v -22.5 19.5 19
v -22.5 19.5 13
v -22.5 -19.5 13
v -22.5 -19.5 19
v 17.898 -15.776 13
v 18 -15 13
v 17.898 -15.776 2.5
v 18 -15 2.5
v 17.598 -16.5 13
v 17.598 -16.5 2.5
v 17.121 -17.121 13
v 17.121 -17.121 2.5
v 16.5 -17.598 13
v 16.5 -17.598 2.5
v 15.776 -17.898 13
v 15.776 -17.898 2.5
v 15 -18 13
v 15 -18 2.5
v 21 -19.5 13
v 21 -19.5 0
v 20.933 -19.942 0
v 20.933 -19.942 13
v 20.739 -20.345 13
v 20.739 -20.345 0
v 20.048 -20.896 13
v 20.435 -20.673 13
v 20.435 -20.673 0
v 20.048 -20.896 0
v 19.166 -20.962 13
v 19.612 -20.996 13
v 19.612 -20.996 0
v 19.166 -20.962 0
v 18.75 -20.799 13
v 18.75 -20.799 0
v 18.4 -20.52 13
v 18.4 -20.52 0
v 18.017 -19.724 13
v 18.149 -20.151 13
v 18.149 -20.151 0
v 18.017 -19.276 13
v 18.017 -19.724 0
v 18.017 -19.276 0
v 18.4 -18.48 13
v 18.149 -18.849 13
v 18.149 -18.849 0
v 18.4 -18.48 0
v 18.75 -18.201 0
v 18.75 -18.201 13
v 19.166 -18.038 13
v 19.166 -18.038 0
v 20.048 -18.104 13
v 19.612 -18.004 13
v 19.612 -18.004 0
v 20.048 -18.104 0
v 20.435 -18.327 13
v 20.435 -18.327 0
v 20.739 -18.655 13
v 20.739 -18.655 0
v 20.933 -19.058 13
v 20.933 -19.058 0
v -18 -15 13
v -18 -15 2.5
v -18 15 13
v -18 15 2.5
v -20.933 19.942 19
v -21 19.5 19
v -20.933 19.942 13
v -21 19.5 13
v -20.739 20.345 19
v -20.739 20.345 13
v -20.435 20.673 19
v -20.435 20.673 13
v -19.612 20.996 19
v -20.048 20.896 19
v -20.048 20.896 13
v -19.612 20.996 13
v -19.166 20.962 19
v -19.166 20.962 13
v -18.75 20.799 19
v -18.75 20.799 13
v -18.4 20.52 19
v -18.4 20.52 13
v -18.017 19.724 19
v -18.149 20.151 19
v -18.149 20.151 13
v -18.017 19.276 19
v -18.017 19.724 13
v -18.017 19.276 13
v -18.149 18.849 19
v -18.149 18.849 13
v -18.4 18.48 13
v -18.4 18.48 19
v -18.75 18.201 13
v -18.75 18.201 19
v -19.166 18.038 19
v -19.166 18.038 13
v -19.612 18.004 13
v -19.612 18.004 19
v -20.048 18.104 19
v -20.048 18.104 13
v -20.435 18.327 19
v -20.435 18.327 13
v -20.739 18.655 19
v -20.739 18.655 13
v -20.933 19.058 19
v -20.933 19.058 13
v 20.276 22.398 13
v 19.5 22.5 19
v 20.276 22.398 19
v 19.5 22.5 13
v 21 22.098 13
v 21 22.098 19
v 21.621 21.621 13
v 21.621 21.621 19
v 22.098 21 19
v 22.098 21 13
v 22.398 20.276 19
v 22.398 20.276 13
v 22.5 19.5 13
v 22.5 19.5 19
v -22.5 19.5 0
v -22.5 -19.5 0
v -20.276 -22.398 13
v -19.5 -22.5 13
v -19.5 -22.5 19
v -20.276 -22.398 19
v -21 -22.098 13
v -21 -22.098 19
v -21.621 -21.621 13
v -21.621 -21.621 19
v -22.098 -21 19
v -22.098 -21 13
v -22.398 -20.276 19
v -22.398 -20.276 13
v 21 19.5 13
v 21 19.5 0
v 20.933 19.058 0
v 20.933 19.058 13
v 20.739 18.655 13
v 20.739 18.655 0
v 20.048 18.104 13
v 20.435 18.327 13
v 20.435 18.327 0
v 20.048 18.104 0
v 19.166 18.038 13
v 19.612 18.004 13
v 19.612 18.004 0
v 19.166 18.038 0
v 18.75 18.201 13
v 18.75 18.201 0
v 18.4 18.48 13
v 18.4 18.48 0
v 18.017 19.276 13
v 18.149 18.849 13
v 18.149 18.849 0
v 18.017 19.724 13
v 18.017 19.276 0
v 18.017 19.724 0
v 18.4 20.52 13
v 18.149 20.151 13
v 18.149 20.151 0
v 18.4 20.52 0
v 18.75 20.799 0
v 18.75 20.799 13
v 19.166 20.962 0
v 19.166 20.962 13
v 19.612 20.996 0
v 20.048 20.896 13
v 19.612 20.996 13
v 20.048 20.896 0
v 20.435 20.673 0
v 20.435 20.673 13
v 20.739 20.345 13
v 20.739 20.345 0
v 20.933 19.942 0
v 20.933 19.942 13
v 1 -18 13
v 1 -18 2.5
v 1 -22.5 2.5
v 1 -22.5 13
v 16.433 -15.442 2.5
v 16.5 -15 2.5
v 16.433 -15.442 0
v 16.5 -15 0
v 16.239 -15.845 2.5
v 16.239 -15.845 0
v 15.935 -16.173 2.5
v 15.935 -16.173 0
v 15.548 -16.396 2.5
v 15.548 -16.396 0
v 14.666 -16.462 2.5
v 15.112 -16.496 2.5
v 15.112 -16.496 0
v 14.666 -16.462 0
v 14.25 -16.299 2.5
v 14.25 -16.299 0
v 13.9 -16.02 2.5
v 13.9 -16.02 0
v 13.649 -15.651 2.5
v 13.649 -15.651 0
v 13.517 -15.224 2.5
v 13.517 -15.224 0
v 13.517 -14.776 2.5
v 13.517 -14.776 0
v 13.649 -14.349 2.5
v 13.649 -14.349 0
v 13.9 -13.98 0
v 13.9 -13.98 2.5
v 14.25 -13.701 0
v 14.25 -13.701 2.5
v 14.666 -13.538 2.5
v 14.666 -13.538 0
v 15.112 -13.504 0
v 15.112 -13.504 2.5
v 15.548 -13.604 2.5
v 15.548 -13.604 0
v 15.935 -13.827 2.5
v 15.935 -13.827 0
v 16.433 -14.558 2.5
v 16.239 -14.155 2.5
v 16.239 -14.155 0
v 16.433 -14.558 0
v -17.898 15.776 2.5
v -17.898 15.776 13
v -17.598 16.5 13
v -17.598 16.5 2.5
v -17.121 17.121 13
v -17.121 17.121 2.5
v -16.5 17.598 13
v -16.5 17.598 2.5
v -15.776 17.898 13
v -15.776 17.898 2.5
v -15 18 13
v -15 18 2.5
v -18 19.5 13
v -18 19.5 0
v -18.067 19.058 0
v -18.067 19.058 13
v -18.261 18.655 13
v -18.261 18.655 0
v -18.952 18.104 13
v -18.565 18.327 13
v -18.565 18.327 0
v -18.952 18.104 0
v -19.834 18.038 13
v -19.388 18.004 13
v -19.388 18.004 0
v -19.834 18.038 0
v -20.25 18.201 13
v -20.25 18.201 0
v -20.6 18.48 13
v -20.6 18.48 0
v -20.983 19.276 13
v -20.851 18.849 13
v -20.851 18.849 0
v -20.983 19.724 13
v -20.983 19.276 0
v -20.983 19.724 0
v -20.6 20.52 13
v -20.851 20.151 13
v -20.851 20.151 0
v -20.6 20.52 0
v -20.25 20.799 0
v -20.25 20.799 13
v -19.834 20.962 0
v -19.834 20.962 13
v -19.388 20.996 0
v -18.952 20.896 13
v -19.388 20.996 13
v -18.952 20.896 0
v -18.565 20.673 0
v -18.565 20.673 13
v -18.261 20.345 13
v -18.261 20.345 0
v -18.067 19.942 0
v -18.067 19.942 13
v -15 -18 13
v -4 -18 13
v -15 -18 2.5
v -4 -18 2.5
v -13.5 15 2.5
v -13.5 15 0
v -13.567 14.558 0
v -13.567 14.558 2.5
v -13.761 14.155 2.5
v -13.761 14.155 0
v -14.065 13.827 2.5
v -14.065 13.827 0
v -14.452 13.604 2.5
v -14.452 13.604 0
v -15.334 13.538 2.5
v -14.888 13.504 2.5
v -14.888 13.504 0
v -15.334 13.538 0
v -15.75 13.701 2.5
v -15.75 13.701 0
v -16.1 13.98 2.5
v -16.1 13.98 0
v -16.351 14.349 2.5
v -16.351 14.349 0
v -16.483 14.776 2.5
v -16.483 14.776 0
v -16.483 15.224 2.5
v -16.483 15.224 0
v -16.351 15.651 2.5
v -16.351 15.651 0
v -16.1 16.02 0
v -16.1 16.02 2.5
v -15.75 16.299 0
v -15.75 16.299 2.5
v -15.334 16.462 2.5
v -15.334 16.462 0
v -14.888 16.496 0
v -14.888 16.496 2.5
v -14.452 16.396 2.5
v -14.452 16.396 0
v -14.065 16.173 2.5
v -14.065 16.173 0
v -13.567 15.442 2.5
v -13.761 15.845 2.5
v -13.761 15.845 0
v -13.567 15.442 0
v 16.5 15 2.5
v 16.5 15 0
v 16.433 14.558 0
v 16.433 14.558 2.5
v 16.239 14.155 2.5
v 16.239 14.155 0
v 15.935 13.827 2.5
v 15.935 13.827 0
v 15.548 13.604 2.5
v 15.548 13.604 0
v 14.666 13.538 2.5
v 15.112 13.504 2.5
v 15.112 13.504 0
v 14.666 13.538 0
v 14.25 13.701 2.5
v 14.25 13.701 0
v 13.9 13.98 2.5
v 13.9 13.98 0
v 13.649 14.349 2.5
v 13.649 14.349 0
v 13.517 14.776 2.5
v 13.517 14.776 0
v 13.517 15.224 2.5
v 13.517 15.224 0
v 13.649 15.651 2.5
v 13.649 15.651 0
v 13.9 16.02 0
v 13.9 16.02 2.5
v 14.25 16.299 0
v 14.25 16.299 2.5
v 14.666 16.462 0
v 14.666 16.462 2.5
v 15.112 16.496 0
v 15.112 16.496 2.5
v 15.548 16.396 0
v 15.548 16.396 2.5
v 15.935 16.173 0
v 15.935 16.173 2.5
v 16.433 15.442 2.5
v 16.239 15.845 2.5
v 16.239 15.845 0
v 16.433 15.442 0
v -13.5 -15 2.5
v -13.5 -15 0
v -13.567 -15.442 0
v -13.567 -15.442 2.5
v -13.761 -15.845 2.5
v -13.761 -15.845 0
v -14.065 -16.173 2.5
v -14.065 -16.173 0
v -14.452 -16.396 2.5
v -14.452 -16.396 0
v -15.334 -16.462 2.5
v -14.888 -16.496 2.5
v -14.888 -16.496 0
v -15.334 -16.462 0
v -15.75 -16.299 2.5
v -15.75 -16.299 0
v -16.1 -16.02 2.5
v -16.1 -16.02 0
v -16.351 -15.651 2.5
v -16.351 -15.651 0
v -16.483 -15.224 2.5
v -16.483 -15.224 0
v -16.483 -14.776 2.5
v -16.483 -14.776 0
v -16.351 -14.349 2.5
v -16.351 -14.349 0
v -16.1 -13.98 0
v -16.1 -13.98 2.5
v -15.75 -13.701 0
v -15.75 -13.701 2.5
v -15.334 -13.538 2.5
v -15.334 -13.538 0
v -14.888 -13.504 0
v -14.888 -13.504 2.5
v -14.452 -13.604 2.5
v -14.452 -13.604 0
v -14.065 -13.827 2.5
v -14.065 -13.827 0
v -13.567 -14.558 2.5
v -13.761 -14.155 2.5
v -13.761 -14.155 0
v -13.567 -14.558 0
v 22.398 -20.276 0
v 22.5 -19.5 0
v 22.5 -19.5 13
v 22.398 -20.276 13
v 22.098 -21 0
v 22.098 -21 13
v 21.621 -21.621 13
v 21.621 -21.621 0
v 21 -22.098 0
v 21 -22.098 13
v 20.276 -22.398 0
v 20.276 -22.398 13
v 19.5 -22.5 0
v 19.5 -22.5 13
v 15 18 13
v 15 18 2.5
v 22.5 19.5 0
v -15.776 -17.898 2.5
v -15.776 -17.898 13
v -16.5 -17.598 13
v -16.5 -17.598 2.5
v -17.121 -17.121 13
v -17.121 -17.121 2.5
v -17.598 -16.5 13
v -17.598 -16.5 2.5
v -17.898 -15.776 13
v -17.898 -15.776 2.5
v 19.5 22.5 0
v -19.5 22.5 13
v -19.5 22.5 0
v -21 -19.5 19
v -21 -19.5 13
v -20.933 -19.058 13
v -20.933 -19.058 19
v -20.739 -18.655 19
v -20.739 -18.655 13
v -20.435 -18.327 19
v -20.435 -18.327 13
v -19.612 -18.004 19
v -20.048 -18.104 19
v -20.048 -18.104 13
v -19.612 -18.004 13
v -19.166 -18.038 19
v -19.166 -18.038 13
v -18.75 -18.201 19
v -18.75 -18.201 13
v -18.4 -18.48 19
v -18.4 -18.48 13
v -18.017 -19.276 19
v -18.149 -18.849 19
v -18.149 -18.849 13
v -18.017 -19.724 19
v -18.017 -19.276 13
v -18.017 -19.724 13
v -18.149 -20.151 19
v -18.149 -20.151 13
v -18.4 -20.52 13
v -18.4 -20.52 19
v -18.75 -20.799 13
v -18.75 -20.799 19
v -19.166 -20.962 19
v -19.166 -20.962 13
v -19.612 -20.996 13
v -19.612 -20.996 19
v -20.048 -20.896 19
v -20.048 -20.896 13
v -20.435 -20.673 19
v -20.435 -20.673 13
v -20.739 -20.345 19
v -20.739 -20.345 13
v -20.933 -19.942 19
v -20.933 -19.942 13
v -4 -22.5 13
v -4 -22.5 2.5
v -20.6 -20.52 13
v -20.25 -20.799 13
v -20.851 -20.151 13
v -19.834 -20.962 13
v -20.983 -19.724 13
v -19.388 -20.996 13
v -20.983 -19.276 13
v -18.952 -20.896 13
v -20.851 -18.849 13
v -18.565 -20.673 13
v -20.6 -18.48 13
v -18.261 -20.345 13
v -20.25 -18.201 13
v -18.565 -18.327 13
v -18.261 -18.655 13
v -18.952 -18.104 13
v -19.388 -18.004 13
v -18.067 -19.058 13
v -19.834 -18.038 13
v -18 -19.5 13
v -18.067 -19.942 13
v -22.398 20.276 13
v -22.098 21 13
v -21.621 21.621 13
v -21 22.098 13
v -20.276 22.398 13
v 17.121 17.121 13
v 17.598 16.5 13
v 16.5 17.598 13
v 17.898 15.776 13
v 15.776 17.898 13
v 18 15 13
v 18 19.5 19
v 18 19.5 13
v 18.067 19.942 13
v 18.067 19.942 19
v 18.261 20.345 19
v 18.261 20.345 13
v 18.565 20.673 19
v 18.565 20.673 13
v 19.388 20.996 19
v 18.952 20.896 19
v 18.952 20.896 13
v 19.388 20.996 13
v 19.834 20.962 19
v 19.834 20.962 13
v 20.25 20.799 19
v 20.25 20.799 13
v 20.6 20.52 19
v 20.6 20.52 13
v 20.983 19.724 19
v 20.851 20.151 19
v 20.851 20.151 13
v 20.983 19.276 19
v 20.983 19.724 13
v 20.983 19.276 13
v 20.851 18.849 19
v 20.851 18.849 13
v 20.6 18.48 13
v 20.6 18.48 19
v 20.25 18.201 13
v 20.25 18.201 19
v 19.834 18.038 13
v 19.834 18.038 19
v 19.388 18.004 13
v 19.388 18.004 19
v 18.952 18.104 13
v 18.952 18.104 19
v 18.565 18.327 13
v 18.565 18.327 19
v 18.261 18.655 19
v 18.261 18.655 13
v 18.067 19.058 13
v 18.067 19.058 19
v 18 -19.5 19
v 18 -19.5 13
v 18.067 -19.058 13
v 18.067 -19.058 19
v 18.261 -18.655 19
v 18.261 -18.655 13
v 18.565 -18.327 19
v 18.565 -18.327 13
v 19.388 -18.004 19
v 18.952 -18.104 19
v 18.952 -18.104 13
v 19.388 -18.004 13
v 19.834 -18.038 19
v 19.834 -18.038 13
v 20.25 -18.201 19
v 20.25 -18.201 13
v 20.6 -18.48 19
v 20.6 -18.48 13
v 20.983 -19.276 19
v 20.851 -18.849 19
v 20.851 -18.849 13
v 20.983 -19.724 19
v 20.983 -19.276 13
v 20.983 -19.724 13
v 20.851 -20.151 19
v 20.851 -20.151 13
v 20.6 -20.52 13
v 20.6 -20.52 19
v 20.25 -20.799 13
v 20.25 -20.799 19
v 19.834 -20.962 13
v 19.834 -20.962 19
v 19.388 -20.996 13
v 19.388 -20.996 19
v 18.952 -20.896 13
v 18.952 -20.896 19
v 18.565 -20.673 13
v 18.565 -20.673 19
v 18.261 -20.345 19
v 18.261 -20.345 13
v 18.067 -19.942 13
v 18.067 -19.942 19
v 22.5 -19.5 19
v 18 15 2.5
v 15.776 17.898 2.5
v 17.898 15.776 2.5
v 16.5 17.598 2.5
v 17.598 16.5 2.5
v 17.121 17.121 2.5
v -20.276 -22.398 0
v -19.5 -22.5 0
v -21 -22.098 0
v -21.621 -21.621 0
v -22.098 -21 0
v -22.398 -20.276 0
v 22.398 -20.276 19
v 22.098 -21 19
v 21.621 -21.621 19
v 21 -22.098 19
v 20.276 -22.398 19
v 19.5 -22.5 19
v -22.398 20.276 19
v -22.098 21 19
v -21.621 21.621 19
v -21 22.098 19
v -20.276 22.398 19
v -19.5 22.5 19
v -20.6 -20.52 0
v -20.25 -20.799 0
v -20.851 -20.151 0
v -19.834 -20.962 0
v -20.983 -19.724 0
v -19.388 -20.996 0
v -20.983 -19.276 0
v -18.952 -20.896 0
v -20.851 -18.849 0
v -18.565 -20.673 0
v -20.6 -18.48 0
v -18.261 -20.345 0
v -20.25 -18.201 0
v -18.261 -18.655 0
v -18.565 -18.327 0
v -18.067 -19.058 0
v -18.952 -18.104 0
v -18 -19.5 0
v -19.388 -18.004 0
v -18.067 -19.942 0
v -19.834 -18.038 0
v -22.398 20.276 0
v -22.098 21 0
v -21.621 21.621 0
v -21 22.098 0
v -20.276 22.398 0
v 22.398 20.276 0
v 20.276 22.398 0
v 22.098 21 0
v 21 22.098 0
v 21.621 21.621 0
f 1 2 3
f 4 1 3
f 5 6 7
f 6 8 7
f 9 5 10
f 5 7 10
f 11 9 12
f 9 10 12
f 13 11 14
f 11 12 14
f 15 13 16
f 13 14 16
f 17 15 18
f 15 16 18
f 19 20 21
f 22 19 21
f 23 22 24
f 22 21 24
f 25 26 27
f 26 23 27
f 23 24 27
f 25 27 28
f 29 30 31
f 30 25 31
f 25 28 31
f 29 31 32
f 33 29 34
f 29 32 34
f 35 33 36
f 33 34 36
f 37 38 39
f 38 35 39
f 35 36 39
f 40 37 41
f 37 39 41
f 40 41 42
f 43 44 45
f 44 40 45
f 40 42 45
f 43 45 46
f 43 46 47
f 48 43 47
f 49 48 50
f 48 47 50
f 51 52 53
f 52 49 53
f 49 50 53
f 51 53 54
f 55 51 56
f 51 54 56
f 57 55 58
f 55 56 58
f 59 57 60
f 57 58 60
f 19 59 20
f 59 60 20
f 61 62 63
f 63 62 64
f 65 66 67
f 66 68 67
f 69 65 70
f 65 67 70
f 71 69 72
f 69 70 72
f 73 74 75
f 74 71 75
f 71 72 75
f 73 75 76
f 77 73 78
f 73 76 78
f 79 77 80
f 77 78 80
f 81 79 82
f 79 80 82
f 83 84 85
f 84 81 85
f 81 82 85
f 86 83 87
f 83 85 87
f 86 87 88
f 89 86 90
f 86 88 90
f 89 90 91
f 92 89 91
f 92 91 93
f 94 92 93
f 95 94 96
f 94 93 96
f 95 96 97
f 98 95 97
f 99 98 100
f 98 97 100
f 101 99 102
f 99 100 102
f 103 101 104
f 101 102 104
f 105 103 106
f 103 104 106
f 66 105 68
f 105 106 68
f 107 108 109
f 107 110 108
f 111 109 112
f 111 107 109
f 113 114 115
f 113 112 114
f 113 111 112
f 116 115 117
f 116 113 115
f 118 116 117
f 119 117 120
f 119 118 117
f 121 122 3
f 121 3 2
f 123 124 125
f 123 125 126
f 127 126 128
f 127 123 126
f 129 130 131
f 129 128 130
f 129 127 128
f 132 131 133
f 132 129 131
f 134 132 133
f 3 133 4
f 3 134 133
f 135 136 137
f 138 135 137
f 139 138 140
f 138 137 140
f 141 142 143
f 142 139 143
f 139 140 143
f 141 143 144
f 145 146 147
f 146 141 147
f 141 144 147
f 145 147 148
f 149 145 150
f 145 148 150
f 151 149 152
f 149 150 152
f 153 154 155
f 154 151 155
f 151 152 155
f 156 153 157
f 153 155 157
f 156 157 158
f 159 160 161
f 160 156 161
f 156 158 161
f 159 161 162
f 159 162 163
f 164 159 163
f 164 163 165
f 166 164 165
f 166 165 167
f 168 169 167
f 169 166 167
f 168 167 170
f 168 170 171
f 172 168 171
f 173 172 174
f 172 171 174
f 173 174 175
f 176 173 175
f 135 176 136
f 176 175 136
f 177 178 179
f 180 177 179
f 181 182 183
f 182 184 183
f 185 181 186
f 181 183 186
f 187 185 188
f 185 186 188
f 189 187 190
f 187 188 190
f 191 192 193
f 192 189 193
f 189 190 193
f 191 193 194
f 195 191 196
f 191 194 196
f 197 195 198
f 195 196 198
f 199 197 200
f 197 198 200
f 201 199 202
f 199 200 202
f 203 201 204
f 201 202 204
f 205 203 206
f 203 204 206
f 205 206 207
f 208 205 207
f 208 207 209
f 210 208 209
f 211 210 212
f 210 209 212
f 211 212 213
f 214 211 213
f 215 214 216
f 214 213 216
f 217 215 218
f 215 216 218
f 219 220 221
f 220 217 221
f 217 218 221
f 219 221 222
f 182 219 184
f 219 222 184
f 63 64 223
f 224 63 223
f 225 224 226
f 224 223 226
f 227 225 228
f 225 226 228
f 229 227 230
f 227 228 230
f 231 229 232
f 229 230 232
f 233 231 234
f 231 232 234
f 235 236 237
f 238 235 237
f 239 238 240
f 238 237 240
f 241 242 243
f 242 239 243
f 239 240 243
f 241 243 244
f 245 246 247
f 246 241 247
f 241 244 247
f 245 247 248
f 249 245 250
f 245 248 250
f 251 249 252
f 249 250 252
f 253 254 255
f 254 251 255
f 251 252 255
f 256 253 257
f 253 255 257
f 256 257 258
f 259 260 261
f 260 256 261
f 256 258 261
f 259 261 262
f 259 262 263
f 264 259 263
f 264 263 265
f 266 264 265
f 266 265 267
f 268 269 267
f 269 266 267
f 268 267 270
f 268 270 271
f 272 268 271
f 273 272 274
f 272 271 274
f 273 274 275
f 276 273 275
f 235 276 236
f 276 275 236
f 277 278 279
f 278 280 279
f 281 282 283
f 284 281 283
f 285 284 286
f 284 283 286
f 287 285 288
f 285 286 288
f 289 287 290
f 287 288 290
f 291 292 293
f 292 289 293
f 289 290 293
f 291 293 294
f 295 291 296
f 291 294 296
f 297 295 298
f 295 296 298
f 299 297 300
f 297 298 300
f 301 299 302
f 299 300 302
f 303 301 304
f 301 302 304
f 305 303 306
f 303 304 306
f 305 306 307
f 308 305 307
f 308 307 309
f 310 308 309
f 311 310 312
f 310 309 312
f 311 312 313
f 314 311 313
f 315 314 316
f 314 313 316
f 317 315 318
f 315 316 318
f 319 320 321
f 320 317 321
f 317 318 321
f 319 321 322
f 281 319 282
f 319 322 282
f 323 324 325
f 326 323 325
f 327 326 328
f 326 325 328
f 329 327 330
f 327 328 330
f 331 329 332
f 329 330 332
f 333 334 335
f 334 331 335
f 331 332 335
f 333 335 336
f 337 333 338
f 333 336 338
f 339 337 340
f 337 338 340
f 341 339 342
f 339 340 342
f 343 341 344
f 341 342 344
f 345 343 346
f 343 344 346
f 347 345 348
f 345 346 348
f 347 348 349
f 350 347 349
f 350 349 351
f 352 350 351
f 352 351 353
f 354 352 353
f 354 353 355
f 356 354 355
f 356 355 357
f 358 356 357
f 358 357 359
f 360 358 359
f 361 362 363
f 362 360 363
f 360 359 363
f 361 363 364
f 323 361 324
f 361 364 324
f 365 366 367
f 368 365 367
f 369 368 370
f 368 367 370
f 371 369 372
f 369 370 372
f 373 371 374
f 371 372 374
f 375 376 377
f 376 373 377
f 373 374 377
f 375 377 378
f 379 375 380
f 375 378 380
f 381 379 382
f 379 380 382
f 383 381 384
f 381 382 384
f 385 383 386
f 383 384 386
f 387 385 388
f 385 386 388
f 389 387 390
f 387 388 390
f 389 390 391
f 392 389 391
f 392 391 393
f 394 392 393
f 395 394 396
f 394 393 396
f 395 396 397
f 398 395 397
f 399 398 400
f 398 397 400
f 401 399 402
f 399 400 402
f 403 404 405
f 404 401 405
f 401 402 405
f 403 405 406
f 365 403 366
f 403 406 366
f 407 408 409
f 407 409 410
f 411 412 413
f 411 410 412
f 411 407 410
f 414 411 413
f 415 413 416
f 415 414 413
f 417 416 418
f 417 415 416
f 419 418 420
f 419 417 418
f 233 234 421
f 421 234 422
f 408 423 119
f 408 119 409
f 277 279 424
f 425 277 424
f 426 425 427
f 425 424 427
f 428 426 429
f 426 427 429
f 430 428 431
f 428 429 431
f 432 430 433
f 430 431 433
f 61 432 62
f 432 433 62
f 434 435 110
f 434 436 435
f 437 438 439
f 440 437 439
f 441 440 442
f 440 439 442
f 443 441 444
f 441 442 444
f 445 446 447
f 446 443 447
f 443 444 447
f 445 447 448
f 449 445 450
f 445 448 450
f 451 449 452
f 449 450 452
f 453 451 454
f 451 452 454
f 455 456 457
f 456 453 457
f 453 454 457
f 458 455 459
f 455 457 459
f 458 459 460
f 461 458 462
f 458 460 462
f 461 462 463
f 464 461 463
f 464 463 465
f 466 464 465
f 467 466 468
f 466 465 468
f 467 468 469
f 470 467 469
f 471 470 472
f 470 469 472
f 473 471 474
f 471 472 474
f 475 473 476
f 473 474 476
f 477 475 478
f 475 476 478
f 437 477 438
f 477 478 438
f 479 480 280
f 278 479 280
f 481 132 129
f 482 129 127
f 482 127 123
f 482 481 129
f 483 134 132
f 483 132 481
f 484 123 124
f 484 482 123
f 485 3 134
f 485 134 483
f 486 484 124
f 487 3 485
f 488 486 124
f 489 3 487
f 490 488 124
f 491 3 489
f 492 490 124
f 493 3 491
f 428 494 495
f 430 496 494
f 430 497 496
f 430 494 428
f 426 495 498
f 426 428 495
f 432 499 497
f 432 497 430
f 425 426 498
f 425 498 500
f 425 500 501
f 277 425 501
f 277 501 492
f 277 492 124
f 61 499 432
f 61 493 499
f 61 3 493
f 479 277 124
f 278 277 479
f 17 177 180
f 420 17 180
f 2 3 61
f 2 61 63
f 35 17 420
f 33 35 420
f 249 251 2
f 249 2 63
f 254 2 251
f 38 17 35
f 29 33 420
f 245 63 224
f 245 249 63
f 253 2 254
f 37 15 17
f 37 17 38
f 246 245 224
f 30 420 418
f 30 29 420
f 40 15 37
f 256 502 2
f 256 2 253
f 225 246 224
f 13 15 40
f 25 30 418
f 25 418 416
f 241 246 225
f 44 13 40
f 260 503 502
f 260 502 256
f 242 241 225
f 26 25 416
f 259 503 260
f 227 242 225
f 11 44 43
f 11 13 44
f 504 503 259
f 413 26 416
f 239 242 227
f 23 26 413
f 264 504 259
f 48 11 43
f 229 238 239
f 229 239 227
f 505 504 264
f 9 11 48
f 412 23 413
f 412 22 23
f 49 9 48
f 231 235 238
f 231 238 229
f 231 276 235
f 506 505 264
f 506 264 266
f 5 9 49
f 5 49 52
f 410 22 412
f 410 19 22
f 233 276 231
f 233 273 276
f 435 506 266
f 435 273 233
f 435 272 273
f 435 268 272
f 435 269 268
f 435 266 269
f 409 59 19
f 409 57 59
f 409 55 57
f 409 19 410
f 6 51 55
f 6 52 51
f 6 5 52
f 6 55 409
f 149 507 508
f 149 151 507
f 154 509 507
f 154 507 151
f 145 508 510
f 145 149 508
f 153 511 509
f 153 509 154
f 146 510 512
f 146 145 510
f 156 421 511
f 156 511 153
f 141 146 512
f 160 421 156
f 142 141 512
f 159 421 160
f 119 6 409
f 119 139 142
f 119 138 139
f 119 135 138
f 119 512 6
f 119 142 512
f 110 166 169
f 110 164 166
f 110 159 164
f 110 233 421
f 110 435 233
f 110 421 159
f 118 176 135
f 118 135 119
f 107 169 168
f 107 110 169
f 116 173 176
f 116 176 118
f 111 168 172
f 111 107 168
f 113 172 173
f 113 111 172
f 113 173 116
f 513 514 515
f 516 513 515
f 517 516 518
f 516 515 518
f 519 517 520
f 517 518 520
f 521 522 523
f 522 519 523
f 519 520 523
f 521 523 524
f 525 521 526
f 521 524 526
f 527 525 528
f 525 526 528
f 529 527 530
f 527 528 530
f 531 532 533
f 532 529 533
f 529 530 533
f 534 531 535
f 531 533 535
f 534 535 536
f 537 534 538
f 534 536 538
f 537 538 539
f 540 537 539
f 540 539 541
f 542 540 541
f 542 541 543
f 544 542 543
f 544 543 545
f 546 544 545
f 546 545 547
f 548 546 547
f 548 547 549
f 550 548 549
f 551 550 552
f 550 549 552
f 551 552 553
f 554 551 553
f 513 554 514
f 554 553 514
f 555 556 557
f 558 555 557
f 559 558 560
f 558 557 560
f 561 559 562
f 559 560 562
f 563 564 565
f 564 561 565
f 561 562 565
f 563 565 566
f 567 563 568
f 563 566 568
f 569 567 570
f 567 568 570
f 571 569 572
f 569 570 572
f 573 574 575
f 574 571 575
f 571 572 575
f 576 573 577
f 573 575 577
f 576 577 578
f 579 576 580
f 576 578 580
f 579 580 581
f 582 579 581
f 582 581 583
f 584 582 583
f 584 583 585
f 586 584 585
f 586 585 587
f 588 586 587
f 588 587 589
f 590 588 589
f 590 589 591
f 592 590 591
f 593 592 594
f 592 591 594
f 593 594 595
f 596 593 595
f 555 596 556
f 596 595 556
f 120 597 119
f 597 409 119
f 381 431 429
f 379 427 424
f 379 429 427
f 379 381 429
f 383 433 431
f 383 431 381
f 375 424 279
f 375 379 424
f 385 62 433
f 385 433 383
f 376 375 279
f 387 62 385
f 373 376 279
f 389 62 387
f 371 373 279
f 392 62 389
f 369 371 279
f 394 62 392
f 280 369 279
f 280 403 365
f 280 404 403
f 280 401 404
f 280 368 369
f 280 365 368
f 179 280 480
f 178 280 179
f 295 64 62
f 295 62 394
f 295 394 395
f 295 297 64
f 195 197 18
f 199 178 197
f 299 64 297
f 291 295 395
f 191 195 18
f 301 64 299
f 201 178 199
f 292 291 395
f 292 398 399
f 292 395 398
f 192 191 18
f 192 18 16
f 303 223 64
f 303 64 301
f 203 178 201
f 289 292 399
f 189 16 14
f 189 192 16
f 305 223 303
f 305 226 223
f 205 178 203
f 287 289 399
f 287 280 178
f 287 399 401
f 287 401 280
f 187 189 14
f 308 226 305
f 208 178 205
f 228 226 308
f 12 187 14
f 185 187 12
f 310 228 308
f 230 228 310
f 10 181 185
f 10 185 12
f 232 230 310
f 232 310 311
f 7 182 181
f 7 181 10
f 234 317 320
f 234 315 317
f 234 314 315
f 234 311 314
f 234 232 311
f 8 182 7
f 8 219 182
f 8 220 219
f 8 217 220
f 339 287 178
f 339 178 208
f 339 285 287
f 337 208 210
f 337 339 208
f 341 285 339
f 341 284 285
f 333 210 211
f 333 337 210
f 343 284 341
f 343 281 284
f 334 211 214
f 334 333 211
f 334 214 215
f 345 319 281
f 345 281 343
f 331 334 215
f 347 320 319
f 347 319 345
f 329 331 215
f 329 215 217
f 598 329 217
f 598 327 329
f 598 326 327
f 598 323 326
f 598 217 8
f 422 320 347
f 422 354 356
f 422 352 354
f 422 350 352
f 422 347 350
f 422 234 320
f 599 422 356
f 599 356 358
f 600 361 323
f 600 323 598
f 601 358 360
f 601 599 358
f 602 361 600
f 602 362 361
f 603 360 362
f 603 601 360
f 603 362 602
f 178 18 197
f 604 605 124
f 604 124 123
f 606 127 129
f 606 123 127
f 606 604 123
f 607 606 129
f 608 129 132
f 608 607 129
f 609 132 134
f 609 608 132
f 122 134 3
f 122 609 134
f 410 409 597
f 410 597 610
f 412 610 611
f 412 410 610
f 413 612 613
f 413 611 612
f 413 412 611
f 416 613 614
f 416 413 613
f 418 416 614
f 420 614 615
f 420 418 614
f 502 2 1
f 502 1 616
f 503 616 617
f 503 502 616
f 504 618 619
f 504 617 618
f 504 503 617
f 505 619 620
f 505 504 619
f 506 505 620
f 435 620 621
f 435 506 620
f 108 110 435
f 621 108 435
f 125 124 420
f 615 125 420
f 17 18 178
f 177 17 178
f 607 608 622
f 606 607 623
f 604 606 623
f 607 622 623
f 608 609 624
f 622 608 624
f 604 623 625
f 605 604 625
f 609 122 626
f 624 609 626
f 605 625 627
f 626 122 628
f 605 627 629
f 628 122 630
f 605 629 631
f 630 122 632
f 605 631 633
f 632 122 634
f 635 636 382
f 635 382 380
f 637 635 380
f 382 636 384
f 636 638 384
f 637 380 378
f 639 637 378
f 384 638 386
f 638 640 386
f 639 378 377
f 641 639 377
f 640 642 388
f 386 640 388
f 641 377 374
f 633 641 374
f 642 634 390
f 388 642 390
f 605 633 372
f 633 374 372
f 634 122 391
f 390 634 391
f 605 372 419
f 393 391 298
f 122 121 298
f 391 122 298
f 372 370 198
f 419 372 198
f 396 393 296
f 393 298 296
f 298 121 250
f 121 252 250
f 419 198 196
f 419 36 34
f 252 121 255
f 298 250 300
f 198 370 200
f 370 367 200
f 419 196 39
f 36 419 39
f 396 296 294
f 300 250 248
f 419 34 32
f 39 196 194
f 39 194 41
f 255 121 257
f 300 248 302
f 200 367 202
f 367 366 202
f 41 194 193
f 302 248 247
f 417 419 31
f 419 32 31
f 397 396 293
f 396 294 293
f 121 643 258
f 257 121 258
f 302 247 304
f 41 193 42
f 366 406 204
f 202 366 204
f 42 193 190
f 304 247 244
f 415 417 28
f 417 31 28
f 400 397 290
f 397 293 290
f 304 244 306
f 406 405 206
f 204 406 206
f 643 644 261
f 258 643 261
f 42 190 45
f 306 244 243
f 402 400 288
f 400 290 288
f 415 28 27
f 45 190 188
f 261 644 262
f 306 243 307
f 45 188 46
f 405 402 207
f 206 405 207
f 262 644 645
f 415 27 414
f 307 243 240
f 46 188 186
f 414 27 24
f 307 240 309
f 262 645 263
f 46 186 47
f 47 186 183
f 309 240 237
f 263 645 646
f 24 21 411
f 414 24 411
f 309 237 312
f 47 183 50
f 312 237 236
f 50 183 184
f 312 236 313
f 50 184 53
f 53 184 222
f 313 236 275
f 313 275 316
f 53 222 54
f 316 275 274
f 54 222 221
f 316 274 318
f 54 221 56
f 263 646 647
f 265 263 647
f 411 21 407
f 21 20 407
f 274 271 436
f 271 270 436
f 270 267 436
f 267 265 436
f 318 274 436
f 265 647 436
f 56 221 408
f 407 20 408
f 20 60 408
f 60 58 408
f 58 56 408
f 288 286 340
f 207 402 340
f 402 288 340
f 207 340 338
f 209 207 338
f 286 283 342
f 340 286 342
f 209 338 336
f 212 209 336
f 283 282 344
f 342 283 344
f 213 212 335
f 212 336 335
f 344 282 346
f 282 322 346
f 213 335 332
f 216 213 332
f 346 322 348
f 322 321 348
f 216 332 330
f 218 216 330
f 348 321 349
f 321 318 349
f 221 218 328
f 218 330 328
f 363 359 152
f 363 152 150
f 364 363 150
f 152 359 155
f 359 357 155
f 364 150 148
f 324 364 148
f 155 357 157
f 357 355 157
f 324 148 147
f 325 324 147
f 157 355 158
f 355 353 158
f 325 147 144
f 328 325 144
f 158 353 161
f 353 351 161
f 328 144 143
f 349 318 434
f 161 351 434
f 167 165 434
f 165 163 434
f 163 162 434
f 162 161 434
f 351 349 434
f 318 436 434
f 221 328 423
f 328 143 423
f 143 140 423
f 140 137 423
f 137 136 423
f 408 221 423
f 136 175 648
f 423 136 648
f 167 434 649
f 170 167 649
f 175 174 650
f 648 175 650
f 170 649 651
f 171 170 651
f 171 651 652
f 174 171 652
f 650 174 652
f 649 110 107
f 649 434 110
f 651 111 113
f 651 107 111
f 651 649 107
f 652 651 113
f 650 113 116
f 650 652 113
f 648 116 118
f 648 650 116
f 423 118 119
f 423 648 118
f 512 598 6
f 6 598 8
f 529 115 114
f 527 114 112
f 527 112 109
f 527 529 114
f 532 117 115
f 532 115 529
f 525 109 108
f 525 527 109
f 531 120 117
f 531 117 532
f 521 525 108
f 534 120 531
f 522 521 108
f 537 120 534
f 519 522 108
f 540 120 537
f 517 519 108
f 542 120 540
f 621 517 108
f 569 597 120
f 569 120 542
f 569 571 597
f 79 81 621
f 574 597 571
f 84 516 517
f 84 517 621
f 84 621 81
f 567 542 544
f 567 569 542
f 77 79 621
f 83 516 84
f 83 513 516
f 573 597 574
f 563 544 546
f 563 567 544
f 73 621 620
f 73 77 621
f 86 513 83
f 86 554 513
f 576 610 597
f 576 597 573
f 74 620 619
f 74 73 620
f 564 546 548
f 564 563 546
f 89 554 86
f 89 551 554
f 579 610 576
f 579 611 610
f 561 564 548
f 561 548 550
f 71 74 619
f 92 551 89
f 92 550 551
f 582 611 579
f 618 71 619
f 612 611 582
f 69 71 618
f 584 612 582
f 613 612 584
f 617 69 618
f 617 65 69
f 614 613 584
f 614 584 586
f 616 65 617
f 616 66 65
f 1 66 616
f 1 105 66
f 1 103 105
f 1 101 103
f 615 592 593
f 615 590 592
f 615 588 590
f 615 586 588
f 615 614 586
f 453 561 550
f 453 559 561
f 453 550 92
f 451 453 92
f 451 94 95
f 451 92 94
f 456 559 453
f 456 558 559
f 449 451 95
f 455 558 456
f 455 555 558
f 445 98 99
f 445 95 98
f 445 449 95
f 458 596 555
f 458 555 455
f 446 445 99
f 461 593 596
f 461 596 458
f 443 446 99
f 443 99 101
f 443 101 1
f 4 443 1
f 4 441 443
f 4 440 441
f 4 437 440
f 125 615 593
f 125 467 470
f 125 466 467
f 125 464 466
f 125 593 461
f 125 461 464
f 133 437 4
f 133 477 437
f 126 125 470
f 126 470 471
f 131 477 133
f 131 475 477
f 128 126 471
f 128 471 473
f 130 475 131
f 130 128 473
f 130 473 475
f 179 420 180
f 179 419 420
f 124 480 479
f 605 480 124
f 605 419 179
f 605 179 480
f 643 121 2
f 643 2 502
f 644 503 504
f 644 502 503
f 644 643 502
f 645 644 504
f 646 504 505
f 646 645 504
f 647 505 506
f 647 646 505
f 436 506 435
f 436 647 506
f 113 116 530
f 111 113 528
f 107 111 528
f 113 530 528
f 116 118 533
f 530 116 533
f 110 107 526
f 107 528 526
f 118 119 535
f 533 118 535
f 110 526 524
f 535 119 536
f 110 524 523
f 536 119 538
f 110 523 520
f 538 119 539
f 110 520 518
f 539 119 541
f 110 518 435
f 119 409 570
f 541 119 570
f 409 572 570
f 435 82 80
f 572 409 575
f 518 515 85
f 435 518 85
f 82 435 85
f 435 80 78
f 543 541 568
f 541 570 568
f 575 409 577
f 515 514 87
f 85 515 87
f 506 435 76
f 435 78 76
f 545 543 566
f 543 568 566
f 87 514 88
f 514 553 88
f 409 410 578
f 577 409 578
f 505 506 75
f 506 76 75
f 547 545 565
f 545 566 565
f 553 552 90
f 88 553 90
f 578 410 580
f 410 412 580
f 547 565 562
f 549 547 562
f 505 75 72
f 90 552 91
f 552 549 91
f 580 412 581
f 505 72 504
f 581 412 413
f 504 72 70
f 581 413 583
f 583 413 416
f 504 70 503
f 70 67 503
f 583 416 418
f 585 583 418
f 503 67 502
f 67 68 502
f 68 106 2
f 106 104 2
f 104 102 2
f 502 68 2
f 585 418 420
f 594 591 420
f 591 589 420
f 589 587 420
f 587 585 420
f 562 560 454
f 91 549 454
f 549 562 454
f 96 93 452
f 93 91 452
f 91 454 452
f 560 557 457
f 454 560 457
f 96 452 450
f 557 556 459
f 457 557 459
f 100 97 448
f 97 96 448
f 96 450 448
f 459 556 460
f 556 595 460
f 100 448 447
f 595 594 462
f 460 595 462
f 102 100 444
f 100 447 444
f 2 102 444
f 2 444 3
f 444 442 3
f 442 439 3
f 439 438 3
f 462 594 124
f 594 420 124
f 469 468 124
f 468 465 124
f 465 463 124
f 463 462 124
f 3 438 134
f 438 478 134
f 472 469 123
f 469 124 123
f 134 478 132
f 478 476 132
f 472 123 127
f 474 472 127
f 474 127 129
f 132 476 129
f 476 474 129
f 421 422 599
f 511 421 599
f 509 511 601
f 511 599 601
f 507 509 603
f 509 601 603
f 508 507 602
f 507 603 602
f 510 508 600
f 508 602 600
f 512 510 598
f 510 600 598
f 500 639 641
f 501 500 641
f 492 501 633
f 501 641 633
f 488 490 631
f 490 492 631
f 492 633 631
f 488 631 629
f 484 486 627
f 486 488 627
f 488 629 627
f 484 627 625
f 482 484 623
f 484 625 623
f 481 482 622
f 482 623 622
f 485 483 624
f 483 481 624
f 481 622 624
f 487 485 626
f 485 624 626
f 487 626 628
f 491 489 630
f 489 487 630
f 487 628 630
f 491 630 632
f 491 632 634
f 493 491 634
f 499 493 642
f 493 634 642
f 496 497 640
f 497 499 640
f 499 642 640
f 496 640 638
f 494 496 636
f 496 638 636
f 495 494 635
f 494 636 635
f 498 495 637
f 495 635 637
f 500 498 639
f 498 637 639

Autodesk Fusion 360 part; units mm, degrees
sketch "Skizze1" plane through (0, 0, 0) normal (0, 0, 1) x (1, 0, 0)
  line L0 (15, -17.5) -> (-15, -17.5)
  line L1 (-17.5, -15) -> (-17.5, 15)
  line L2 (-15, 17.5) -> (15, 17.5)
  line L3 (17.5, 15) -> (17.5, -15)
  line L4 (17.5, -17.5) -> (-17.5, 17.5) construction
  line L5 (-17.5, -17.5) -> (17.5, 17.5) construction
  circle A0 centre (-15, 15) radius 1.5
  arc A1 (-15, 17.5) -> (-17.5, 15) centre (-15, 15) ccw
  arc A2 (-17.5, -15) -> (-15, -17.5) centre (-15, -15) ccw
  arc A3 (15, -17.5) -> (17.5, -15) centre (15, -15) ccw
  arc A4 (17.5, 15) -> (15, 17.5) centre (15, 15) ccw
  circle A5 centre (15, 15) radius 1.5
  circle A6 centre (-15, -15) radius 1.5
  circle A7 centre (15, -15) radius 1.5
  dimension "d1" = 35
  dimension "d2" = 35
  dimension "d3" = 3
  dimension "d4" = 2.5
  dimension "d5" = 2.5
  dimension "d8" = 30
  dimension "d9" = -30
sketch "Skizze2" plane through (0, 0, 0) normal (0, 0, 1) x (1, 0, 0)
  line L0 (19.5, -22.5) -> (-19.5, -22.5)
  line L1 (-22.5, -19.5) -> (-22.5, 19.5)
  line L2 (-19.5, 22.5) -> (19.5, 22.5)
  line L3 (22.5, 19.5) -> (22.5, -19.5)
  line L4 (22.5, -22.5) -> (-22.5, 22.5) construction
  line L5 (-22.5, -22.5) -> (22.5, 22.5) construction
  arc A0 (-19.5, 22.5) -> (-22.5, 19.5) centre (-19.5, 19.5) ccw
  arc A1 (22.5, 19.5) -> (19.5, 22.5) centre (19.5, 19.5) ccw
  arc A2 (19.5, -22.5) -> (22.5, -19.5) centre (19.5, -19.5) ccw
  arc A3 (-22.5, -19.5) -> (-19.5, -22.5) centre (-19.5, -19.5) ccw
  line L6 (15, -18) -> (-15, -18)
  line L7 (-18, -15) -> (-18, 15)
  line L8 (-15, 18) -> (15, 18)
  line L9 (18, 15) -> (18, -15)
  line L10 (18, -18) -> (-18, 18) construction
  line L11 (-18, -18) -> (18, 18) construction
  arc A4 (-15, 18) -> (-18, 15) centre (-15, 15) ccw
  arc A5 (-18, -15) -> (-15, -18) centre (-15, -15) ccw
  arc A6 (15, -18) -> (18, -15) centre (15, -15) ccw
  arc A7 (18, 15) -> (15, 18) centre (15, 15) ccw
  circle A8 centre (-19.5, 19.5) radius 1.5
  circle A9 centre (19.5, 19.5) radius 1.5
  circle A10 centre (-19.5, -19.5) radius 1.5
  circle A11 centre (19.5, -19.5) radius 1.5
  line L12 (-4, -18) -> (1, -18)
  line L13 (1, -18) -> (1, -22.5)
  line L14 (1, -22.5) -> (-4, -22.5)
  line L15 (-4, -22.5) -> (-4, -18)
  dimension "d10" = 45
  dimension "d11" = 45
  dimension "d12" = 3
  dimension "d13" = 3
  dimension "d24" = 3
  dimension "d25" = 3
  dimension "d28" = 39
  dimension "d29" = -39
  dimension "d30" = 5
  dimension "d31" = 14
extrude "Extrusion1" add sketch "Skizze2" along normal blind 2.5 makes body 1
extrude "Extrusion2" add sketch "Skizze2" along normal blind 13 contours L0 L1 L2 L3 A0 A1 A2 A3 L6 L7 L8 L9 A4 A5 A6 A7 L13 L15 bodies 1
extrude "Extrusion4" cut sketch "Skizze1" along normal blind 2.5 contours A0 | A5 | A6 | A7 bodies 1
thread "Gewinde1" thread offset 0 thread length 10
sketch "Skizze3" plane through (0, 0, 13) normal (0, 0, 1) x (-1, 0, 0)
  circle A0 centre (19.5, -19.5) radius 1.5
  circle A1 centre (-19.5, -19.5) radius 1.5
  circle A2 centre (19.5, 19.5) radius 1.5
  circle A3 centre (-19.5, 19.5) radius 1.5
  arc A4 (22.5, 19.5) -> (19.5, 22.5) centre (19.5, 19.5) ccw
  line L0 (19.5, 22.5) -> (4, 22.5)
  line L1 (4, 22.5) -> (4, 18)
  line L2 (4, 18) -> (15, 18)
  arc A5 (18, 15) -> (15, 18) centre (15, 15) ccw
  line L3 (18, 15) -> (18, -15)
  arc A6 (15, -18) -> (18, -15) centre (15, -15) ccw
  line L4 (15, -18) -> (-15, -18)
  arc A7 (-18, -15) -> (-15, -18) centre (-15, -15) ccw
  line L5 (-18, -15) -> (-18, 15)
  arc A8 (-15, 18) -> (-18, 15) centre (-15, 15) ccw
  line L6 (-15, 18) -> (-1, 18)
  line L7 (-1, 18) -> (-1, 22.5)
  line L8 (-1, 22.5) -> (-19.5, 22.5)
  arc A9 (-19.5, 22.5) -> (-22.5, 19.5) centre (-19.5, 19.5) ccw
  line L9 (-22.5, 19.5) -> (-22.5, -19.5)
  arc A10 (-22.5, -19.5) -> (-19.5, -22.5) centre (-19.5, -19.5) ccw
  line L10 (-19.5, -22.5) -> (19.5, -22.5)
  arc A11 (19.5, -22.5) -> (22.5, -19.5) centre (19.5, -19.5) ccw
  line L11 (22.5, -19.5) -> (22.5, 19.5)
  line L12 (-19.5, 22.5) -> (19.5, 22.5)
  line L13 (22.5, 19.5) -> (22.5, -19.5)
  line L14 (19.5, -22.5) -> (-19.5, -22.5)
  line L15 (-22.5, -19.5) -> (-22.5, 19.5)
  line L16 (-22.5, 22.5) -> (22.5, -22.5) construction
  line L17 (22.5, 22.5) -> (-22.5, -22.5) construction
  arc A12 (19.5, -22.5) -> (22.5, -19.5) centre (19.5, -19.5) ccw
  arc A13 (22.5, 19.5) -> (19.5, 22.5) centre (19.5, 19.5) ccw
  arc A14 (-19.5, 22.5) -> (-22.5, 19.5) centre (-19.5, 19.5) ccw
  arc A15 (-22.5, -19.5) -> (-19.5, -22.5) centre (-19.5, -19.5) ccw
  dimension "d32" = 45
  dimension "d33" = 45
  dimension "d34" = 3
extrude "Extrusion5" add sketch "Skizze3" along normal blind 6 separate body makes body 2
